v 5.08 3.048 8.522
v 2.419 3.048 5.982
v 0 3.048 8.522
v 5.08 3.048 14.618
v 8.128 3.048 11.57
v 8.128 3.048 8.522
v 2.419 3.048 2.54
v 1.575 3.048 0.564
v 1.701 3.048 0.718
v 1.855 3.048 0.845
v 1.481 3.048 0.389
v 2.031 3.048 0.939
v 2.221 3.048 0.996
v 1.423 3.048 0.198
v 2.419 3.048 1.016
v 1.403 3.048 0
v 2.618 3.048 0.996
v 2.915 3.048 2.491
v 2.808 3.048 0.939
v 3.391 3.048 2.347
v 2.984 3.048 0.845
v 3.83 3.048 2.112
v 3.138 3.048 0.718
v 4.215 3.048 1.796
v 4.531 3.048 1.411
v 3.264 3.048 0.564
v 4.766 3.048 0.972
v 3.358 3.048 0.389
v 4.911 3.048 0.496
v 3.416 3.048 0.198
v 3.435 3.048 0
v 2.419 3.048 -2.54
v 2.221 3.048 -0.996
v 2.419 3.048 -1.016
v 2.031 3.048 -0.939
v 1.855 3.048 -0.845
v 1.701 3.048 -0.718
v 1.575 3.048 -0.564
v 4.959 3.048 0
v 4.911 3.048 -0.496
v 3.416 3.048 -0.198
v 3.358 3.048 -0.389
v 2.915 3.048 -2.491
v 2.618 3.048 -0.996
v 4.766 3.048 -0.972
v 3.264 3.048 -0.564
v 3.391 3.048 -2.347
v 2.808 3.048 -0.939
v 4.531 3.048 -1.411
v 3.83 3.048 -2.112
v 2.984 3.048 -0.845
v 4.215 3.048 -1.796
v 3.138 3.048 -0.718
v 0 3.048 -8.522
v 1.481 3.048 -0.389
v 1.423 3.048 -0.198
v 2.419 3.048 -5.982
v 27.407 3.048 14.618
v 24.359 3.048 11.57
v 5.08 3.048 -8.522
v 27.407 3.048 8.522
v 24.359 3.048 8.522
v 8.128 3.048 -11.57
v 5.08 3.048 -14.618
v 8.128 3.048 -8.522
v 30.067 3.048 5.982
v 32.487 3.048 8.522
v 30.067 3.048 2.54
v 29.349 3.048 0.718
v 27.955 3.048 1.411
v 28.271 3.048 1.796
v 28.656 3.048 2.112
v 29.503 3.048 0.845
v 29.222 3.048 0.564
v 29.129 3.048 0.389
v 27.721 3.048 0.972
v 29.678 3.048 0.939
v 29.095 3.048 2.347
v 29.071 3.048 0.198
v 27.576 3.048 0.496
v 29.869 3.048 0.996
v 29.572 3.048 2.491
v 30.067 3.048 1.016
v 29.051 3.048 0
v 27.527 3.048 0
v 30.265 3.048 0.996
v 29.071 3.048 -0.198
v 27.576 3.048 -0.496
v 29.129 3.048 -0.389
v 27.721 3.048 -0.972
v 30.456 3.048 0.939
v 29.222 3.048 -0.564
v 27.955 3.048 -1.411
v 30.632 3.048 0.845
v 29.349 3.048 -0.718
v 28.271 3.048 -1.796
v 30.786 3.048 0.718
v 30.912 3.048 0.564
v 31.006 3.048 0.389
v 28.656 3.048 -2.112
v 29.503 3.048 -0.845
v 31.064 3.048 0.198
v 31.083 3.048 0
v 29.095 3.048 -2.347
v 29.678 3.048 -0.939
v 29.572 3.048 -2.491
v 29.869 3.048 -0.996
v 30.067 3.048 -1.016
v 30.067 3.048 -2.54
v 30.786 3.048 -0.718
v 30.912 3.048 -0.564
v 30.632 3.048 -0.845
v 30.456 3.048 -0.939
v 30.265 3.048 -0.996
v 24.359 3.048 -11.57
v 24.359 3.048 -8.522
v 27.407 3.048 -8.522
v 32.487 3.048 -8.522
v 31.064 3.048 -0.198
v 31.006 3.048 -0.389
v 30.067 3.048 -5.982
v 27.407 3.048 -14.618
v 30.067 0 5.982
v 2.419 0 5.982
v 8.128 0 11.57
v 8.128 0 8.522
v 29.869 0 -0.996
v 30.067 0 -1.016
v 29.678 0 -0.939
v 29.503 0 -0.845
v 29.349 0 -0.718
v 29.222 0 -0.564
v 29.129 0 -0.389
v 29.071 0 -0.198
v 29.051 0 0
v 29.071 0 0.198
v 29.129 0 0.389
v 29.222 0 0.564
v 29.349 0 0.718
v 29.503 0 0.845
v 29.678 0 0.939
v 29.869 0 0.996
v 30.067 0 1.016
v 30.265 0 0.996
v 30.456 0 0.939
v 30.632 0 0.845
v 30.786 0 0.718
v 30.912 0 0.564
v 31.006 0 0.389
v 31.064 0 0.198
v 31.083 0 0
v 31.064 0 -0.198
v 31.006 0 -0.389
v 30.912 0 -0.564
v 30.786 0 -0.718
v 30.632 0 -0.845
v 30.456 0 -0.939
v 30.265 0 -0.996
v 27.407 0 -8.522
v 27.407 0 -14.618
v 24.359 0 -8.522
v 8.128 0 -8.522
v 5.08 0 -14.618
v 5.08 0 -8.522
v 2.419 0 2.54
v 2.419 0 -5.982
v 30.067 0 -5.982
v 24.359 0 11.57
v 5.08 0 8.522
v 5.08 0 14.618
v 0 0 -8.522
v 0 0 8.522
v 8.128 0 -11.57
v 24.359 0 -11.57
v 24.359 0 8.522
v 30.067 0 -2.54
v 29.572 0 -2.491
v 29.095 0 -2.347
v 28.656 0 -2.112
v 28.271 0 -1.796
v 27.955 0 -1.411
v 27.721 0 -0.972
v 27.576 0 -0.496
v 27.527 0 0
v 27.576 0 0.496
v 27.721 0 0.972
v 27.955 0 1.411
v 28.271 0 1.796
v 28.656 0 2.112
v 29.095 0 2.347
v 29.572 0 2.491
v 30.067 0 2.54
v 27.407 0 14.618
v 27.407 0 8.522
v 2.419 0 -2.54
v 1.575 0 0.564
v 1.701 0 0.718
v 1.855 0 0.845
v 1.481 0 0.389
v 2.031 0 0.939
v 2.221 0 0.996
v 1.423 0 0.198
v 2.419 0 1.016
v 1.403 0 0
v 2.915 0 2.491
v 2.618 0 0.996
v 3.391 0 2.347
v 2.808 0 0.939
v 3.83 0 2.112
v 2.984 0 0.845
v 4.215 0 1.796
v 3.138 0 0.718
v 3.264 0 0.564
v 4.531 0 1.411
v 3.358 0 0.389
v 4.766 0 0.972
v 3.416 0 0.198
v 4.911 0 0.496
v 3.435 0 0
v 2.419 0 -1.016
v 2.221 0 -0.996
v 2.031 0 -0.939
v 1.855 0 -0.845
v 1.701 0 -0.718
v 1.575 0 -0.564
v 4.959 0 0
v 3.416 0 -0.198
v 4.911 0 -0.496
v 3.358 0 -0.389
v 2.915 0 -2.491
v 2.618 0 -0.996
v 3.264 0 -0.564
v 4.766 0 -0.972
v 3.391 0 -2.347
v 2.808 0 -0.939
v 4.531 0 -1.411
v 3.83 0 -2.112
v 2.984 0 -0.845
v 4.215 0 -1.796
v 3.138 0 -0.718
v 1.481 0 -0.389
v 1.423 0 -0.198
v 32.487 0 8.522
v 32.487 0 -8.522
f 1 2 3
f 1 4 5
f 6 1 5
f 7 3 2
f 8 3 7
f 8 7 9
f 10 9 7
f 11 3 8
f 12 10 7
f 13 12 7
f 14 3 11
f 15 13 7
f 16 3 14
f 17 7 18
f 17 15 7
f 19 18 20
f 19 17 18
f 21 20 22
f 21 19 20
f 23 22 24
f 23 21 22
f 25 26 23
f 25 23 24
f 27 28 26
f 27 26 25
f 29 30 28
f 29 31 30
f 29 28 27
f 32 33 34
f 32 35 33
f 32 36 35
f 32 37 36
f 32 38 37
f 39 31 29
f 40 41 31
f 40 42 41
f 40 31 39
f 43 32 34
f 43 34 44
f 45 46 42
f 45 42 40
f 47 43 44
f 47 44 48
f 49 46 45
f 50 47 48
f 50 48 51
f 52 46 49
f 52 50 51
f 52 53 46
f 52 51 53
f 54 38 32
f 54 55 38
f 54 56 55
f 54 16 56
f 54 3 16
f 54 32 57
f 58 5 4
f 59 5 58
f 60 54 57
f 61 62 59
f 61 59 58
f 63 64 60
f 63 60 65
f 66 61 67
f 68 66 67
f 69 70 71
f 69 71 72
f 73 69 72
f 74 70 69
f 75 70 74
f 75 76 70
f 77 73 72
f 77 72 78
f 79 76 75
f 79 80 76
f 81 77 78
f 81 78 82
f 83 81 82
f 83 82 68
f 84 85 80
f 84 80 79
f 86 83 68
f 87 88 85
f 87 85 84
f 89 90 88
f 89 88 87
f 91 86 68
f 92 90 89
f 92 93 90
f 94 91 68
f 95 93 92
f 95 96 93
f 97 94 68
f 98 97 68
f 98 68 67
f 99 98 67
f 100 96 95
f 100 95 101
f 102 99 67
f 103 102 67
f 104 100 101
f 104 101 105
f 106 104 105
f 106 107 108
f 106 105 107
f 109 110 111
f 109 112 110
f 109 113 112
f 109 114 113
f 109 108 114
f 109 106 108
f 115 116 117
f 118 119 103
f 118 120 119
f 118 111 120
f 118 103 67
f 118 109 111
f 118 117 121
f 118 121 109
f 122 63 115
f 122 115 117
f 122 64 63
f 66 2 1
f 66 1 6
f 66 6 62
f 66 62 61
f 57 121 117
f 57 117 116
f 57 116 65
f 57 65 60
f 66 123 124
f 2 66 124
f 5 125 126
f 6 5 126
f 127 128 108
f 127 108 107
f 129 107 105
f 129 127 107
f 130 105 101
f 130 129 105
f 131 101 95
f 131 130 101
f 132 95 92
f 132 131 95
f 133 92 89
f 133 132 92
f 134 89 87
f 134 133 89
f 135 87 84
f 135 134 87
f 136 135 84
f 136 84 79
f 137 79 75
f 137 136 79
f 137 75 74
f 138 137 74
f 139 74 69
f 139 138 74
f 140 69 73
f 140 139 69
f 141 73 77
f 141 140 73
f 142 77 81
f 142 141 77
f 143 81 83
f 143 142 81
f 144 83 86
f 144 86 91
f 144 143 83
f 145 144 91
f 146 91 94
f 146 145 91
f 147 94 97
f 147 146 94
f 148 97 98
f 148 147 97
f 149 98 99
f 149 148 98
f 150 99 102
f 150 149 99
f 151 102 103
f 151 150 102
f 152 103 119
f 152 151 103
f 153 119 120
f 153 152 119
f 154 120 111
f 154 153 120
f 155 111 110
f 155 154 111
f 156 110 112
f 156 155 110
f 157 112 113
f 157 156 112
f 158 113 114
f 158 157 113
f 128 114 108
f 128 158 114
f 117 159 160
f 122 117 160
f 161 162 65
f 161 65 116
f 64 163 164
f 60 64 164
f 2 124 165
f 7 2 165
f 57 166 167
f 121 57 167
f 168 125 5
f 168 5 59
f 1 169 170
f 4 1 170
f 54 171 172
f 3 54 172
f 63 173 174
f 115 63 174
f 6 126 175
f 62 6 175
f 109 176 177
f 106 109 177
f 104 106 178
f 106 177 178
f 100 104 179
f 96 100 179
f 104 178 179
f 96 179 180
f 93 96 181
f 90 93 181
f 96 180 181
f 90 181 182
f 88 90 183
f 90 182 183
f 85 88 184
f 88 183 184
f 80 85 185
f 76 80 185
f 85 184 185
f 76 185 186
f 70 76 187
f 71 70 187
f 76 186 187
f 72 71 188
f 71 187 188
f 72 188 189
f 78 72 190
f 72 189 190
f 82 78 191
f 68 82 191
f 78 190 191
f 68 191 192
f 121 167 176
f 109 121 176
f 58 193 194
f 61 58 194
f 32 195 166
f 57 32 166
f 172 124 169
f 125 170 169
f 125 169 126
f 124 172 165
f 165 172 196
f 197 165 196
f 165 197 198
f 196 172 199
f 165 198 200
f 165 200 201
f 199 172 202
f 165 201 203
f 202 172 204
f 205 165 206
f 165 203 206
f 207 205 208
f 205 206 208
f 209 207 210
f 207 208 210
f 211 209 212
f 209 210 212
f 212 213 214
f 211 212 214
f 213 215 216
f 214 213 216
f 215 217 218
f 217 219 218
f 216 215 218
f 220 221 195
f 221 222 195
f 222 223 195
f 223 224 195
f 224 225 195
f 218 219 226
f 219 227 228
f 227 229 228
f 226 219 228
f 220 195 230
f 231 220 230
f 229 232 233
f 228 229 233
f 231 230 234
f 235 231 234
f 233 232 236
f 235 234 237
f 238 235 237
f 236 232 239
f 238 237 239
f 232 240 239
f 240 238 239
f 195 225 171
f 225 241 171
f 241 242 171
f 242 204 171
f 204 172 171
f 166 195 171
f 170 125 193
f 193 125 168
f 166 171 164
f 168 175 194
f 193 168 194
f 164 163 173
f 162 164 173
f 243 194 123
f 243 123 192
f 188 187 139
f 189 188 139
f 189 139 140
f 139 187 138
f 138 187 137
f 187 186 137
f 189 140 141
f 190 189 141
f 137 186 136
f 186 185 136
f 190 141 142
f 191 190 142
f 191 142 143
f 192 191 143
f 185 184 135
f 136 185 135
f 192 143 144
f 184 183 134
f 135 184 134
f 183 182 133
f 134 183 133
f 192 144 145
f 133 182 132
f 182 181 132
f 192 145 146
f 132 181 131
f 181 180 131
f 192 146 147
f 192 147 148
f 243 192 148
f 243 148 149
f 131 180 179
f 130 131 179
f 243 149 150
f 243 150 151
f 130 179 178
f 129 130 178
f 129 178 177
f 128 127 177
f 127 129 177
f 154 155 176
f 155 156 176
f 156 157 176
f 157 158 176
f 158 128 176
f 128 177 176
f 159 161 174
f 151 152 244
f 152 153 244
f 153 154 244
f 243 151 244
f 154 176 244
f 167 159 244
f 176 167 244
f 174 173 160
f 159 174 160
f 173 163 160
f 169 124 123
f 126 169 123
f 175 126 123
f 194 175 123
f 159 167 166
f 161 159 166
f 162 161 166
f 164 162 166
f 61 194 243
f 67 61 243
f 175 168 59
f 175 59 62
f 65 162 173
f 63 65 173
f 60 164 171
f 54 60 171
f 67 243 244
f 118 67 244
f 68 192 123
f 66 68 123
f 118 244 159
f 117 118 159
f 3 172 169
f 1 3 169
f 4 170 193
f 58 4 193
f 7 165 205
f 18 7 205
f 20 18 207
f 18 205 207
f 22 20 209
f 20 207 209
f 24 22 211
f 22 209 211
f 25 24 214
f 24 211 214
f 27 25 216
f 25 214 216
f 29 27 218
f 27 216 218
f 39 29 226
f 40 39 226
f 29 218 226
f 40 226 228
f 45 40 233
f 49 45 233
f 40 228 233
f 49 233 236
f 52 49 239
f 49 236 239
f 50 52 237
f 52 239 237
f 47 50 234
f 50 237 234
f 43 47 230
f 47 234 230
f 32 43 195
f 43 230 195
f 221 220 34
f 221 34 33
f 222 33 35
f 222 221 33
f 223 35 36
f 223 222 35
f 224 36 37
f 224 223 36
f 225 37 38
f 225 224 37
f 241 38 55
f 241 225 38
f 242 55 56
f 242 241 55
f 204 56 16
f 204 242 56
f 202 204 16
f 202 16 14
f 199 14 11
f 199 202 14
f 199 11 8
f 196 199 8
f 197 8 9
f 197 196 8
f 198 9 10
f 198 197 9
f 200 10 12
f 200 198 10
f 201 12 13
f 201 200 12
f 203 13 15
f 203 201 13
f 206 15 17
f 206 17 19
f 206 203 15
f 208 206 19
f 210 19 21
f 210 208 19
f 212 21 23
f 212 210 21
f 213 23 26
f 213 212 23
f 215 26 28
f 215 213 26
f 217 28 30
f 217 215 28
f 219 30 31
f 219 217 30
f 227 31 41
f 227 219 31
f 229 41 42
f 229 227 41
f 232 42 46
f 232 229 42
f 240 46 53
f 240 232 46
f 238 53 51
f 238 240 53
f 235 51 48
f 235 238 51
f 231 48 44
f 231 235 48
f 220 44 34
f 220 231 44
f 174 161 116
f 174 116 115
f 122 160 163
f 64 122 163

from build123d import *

# Parameters (mm, degrees)
SKETCH1_W           = 16.2306
SKETCH1_H           = 3.048
SKETCH1_R           = 1.016
BOSS_EXTRUDE1_DEPTH = 3.048


with BuildPart() as part:
    # Sketch1 → Boss-Extrude1 (new body)
    with BuildSketch(Plane(origin=(0, 0, 0), x_dir=(1, 0, 0), z_dir=(0, 1, 0))):
        Polygon((0, 8.5217), (0, -8.5217), (5.08, -8.5217), (5.08, -14.6177), (27.4066, -14.6177), (27.4066, -8.5217), (32.4866, -8.5217), (32.4866, 8.5217), (27.4066, 8.5217), (27.4066, 14.6177), (5.08, 14.6177), (5.08, 8.5217), align=None)
        with Locations((16.2433, -10.0457)):
            Rectangle(SKETCH1_W, SKETCH1_H, mode=Mode.SUBTRACT)
        with Locations((16.2433, 10.0457)):
            Rectangle(SKETCH1_W, SKETCH1_H, mode=Mode.SUBTRACT)
        with BuildLine():
            Line((30.06725, -5.9817), (2.41935, -5.9817))
            Line((2.41935, -5.9817), (2.41935, -2.54))
            ThreePointArc((2.41935, -2.54), (4.95935, 0), (2.41935, 2.54))
            Line((2.41935, 2.54), (2.41935, 5.9817))
            Line((2.41935, 5.9817), (30.06725, 5.9817))
            Line((30.06725, 5.9817), (30.06725, 2.54))
            ThreePointArc((30.06725, 2.54), (27.52725, 0), (30.06725, -2.54))
            Line((30.06725, -2.54), (30.06725, -5.9817))
        make_face(mode=Mode.SUBTRACT)
        with Locations(Location((2.41935, 0, 0), (0, 0, 90))):
            Circle(SKETCH1_R, mode=Mode.SUBTRACT)
        with Locations(Location((30.06725, 0, 0), (0, 0, 90))):
            Circle(SKETCH1_R, mode=Mode.SUBTRACT)
    extrude(amount=BOSS_EXTRUDE1_DEPTH)


solid = part.part
